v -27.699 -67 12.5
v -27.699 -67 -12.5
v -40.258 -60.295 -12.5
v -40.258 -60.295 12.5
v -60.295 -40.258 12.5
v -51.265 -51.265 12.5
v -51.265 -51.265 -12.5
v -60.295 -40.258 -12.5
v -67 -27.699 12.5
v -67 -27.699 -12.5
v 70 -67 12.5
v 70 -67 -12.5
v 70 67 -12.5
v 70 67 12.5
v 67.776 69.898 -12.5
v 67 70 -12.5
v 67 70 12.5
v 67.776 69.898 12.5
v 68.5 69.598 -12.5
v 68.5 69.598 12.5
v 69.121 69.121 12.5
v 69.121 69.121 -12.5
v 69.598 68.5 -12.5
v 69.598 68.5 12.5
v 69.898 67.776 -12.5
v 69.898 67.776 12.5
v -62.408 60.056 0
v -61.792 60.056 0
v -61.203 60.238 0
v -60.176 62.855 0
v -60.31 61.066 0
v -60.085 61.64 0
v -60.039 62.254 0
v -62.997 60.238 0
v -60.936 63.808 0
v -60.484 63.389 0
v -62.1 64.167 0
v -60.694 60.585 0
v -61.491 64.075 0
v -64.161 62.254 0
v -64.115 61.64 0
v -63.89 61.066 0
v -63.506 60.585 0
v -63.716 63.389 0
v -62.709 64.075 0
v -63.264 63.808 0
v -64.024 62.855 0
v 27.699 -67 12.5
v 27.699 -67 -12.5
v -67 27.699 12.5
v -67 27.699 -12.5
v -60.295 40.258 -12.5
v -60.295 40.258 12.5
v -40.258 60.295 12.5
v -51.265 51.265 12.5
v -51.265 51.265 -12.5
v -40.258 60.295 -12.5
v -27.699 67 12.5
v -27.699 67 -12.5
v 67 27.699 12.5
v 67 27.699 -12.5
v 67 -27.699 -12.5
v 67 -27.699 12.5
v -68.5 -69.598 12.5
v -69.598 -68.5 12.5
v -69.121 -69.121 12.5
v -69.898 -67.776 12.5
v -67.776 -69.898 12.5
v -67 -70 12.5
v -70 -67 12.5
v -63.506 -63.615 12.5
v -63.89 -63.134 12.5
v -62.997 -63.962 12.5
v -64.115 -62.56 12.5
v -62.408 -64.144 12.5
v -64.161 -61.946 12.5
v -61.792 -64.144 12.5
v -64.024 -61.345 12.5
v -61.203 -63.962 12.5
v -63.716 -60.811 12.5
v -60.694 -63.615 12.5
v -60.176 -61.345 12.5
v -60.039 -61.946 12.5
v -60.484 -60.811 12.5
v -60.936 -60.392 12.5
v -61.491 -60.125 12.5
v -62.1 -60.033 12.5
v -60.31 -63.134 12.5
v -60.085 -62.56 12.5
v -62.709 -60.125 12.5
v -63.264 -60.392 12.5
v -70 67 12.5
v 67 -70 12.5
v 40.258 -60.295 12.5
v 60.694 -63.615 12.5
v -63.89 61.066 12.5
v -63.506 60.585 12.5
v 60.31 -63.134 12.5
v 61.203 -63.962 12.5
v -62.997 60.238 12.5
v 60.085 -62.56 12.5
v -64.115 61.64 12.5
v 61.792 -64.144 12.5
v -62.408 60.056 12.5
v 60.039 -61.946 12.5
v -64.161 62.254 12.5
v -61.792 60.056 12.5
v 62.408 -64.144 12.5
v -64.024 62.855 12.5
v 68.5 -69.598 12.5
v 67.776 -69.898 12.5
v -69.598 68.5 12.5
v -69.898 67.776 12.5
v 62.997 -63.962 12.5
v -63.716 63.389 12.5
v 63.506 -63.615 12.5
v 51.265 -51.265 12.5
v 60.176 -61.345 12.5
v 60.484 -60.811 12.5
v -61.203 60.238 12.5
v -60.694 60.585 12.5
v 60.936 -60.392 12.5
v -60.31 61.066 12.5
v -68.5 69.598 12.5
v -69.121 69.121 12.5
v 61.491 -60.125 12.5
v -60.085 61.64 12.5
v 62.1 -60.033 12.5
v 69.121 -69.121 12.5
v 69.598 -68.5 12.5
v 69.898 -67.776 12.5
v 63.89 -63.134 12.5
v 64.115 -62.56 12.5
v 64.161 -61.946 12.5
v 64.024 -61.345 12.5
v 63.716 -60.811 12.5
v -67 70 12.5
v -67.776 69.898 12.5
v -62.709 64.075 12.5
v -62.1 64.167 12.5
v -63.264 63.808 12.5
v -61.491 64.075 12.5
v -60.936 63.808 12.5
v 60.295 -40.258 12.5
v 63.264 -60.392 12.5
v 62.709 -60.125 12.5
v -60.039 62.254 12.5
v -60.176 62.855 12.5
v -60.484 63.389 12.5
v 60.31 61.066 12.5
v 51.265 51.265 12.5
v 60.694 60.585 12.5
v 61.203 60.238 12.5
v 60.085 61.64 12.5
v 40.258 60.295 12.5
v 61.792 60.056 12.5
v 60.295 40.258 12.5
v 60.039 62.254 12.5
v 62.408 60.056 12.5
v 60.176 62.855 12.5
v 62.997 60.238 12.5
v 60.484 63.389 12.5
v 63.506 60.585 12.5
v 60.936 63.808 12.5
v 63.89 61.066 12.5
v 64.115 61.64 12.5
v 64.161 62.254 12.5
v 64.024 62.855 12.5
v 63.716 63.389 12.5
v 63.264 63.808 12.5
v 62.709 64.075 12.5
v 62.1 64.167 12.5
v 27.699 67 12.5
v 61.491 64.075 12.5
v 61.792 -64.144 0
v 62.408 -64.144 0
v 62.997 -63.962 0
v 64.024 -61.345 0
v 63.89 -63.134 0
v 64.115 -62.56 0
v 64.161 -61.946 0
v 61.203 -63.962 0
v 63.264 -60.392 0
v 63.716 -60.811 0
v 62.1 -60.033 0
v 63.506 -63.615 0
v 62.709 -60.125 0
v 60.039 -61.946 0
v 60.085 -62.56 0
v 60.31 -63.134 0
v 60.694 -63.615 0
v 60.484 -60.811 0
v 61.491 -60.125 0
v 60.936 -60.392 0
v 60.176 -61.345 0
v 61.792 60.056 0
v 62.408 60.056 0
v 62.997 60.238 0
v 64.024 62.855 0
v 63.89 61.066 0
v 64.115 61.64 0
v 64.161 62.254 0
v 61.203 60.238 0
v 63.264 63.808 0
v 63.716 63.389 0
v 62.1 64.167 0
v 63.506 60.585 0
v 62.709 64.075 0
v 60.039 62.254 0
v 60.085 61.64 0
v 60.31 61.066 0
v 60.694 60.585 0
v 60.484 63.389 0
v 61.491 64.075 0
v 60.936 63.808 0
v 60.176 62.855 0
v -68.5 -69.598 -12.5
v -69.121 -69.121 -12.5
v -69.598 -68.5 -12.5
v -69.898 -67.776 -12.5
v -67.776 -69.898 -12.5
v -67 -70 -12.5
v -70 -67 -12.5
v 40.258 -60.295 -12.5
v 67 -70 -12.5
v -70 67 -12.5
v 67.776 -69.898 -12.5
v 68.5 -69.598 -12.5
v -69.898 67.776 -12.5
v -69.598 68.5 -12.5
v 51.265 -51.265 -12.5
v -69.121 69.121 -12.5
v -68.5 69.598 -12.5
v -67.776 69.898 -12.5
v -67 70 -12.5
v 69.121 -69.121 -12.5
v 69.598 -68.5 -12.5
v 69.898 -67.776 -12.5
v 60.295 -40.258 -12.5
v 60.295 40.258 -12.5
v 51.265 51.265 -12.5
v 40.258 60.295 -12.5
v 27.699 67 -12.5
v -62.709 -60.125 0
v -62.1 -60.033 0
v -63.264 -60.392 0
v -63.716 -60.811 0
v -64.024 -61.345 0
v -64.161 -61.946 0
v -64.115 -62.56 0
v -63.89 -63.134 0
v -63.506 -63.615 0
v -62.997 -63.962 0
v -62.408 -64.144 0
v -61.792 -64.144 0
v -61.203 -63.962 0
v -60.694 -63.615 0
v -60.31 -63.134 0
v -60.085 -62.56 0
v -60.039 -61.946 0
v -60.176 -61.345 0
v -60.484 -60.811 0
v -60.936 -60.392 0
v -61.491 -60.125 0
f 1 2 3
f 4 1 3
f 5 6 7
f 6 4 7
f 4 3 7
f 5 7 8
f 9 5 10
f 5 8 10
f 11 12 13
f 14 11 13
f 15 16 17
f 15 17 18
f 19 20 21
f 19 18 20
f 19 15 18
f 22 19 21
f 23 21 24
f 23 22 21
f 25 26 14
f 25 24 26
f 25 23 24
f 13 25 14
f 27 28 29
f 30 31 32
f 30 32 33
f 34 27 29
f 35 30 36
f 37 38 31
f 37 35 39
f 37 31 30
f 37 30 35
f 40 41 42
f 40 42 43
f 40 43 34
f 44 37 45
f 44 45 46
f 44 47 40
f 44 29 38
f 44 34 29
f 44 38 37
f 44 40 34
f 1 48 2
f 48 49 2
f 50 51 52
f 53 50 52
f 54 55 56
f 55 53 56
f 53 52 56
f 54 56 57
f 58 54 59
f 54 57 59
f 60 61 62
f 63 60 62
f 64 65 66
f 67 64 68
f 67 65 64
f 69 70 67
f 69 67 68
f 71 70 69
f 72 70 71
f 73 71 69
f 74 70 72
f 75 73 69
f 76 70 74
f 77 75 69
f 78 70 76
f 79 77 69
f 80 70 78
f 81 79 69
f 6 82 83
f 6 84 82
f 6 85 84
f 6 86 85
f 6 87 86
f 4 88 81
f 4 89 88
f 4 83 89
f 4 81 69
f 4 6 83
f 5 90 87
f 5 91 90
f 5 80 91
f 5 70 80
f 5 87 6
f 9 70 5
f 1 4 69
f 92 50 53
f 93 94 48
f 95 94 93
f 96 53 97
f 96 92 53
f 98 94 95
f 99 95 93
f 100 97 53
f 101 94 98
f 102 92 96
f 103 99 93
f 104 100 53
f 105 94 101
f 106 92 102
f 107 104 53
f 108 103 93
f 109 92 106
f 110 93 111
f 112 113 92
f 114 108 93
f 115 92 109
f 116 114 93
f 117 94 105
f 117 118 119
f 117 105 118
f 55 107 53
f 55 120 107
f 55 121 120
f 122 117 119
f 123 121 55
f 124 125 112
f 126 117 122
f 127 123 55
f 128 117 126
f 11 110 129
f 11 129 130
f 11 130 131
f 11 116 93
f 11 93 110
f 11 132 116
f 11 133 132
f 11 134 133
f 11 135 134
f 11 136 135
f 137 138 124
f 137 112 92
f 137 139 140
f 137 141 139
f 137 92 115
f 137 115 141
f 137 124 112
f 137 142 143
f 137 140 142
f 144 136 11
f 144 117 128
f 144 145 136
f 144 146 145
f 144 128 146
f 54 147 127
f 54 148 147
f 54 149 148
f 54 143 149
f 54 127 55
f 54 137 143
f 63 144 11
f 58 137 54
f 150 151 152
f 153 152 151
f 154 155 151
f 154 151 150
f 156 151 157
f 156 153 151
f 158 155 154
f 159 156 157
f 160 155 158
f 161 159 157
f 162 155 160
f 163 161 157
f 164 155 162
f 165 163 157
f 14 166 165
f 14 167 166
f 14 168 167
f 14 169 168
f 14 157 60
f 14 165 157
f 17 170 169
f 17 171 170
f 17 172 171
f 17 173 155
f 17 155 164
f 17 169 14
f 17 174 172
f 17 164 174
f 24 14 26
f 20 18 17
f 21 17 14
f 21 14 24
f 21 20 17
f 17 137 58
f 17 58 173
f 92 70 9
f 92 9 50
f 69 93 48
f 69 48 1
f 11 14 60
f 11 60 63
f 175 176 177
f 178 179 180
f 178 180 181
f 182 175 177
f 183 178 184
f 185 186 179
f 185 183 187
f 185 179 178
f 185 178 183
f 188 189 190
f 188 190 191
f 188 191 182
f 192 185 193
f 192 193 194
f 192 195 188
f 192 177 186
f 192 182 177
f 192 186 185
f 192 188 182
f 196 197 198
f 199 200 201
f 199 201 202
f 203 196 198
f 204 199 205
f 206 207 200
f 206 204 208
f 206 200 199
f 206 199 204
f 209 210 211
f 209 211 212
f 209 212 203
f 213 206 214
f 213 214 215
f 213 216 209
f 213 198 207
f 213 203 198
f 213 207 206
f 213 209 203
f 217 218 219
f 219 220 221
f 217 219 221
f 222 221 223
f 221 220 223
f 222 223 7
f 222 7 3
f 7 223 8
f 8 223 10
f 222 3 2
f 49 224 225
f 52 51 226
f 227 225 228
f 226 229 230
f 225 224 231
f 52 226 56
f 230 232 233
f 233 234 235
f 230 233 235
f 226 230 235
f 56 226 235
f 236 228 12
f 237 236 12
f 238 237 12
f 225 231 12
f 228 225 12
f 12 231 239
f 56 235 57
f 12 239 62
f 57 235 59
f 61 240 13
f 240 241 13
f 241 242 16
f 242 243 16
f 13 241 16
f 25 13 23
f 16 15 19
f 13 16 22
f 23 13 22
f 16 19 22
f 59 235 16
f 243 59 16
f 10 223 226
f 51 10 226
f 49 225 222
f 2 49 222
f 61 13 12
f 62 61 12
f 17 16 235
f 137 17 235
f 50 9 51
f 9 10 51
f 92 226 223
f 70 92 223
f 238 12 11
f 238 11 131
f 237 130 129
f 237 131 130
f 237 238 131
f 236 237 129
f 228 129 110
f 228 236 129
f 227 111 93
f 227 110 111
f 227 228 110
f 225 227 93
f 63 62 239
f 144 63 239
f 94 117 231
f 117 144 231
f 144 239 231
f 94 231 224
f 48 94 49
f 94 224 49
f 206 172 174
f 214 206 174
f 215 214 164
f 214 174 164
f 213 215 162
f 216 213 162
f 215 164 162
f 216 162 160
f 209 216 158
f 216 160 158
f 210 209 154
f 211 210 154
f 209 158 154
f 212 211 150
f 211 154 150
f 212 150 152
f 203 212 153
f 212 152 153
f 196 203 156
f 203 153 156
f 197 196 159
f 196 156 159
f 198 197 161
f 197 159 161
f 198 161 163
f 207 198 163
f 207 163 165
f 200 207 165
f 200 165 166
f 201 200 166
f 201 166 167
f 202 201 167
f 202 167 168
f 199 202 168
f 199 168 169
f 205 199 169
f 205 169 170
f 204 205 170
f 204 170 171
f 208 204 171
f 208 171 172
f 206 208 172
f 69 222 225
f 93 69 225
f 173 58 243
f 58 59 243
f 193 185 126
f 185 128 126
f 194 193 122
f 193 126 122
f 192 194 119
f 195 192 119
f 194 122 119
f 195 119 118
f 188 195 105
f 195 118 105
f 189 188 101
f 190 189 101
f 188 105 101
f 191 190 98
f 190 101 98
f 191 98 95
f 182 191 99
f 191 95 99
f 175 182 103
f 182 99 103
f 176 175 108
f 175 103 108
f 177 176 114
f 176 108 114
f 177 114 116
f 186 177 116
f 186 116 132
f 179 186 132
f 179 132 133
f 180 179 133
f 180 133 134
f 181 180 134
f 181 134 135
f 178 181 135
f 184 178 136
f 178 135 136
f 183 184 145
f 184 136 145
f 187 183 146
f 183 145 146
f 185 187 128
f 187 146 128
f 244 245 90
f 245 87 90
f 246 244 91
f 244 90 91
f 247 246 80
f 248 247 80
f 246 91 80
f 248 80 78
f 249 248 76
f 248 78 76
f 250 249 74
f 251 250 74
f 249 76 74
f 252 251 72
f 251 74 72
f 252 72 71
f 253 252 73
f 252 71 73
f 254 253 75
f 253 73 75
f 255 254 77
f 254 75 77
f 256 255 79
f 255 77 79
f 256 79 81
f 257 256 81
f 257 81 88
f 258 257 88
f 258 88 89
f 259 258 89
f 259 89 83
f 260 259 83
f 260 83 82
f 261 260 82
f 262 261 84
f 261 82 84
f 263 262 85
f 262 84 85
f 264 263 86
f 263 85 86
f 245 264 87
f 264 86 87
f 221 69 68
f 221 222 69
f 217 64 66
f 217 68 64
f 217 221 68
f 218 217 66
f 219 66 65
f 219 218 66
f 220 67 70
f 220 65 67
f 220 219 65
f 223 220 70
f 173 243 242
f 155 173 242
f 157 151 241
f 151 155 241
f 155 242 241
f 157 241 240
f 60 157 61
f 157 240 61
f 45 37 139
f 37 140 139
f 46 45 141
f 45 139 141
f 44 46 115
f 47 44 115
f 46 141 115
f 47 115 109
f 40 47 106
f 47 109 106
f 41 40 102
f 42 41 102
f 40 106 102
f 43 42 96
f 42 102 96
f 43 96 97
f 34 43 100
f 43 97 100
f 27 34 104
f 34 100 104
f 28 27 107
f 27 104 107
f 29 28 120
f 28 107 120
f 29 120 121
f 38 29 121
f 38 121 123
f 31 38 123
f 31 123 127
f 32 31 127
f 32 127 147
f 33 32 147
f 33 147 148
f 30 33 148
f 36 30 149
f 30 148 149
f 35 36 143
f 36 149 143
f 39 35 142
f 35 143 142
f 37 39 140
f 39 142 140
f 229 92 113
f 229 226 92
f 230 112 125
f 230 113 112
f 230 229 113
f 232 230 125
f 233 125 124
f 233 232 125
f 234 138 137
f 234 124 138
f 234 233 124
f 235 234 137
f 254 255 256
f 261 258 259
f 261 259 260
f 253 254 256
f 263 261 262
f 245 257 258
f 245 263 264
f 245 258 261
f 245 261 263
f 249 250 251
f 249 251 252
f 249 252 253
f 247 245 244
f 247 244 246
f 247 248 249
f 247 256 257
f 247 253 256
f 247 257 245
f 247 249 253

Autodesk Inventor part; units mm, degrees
ref_plane "YZ Plane" through (0, 0, 0) normal (1, 0, 0) x (0, 1, 0)
ref_plane "XZ Plane" through (0, 0, 0) normal (0, 1, 0) x (-1, 0, 0)
ref_plane "XY Plane" through (0, 0, 0) normal (0, 0, 1) x (1, 0, 0)
sketch "Sketch1" plane through (0, 0, 0) normal (0, 0, 1) x (1, 0, 0)
  line L0 (-67, -70) -> (67, -70)
  line L1 (70, -67) -> (70, 67)
  line L2 (67, 70) -> (-67, 70)
  line L3 (-70, 67) -> (-70, -67)
  line L4 (-70, -70) -> (70, 70) construction
  line L5 (70, -70) -> (-70, 70) construction
  arc A0 (-67, 70) -> (-70, 67) centre (-67, 67) ccw
  arc A1 (-70, -67) -> (-67, -70) centre (-67, -67) ccw
  arc A2 (67, -70) -> (70, -67) centre (67, -67) ccw
  arc A3 (70, 67) -> (67, 70) centre (67, 67) ccw
  line L6 (-62.1, -62.1) -> (62.1, -62.1) construction
  line L7 (62.1, -62.1) -> (62.1, 62.1) construction
  line L8 (62.1, 62.1) -> (-62.1, 62.1) construction
  line L9 (-62.1, 62.1) -> (-62.1, -62.1) construction
  line L10 (-62.1, -62.1) -> (62.1, 62.1) construction
  line L11 (62.1, -62.1) -> (-62.1, 62.1) construction
  line L12 (-27.6993, 67) -> (27.6993, 67)
  line L13 (67, 27.6993) -> (67, -27.6993)
  line L14 (27.6993, -67) -> (-27.6993, -67)
  line L15 (-67, -27.6993) -> (-67, 27.6993)
  arc A4 (67, 27.6993) -> (27.6993, 67) centre (0, 0) ccw
  arc A5 (27.6993, -67) -> (67, -27.6993) centre (0, 0) ccw
  arc A6 (-27.6993, 67) -> (-67, 27.6993) centre (0, 0) ccw
  arc A7 (-67, -27.6993) -> (-27.6993, -67) centre (0, 0) ccw
  point P0 (0, 0)
  point P1 (51.2652, -51.2652)
  point P2 (-51.2652, 51.2652)
  dimension "d0" = 140
  dimension "d1" = 140
  dimension "d2" = 3
  dimension "d3" = 124.2
  dimension "d4" = 124.2
  dimension "d6" = 145
  dimension "d7" = 134
extrude "Extrusion1" add sketch "Sketch1" along normal mid plane 25
hole "Hole1" at (-62.1, 62.1, 0) at (62.1, 62.1, 0) at (62.1, -62.1, 0) at (-62.1, -62.1, 0) direction (0, 0, 1) diameter 4.134 end through all
properties part number "nf-a14"
